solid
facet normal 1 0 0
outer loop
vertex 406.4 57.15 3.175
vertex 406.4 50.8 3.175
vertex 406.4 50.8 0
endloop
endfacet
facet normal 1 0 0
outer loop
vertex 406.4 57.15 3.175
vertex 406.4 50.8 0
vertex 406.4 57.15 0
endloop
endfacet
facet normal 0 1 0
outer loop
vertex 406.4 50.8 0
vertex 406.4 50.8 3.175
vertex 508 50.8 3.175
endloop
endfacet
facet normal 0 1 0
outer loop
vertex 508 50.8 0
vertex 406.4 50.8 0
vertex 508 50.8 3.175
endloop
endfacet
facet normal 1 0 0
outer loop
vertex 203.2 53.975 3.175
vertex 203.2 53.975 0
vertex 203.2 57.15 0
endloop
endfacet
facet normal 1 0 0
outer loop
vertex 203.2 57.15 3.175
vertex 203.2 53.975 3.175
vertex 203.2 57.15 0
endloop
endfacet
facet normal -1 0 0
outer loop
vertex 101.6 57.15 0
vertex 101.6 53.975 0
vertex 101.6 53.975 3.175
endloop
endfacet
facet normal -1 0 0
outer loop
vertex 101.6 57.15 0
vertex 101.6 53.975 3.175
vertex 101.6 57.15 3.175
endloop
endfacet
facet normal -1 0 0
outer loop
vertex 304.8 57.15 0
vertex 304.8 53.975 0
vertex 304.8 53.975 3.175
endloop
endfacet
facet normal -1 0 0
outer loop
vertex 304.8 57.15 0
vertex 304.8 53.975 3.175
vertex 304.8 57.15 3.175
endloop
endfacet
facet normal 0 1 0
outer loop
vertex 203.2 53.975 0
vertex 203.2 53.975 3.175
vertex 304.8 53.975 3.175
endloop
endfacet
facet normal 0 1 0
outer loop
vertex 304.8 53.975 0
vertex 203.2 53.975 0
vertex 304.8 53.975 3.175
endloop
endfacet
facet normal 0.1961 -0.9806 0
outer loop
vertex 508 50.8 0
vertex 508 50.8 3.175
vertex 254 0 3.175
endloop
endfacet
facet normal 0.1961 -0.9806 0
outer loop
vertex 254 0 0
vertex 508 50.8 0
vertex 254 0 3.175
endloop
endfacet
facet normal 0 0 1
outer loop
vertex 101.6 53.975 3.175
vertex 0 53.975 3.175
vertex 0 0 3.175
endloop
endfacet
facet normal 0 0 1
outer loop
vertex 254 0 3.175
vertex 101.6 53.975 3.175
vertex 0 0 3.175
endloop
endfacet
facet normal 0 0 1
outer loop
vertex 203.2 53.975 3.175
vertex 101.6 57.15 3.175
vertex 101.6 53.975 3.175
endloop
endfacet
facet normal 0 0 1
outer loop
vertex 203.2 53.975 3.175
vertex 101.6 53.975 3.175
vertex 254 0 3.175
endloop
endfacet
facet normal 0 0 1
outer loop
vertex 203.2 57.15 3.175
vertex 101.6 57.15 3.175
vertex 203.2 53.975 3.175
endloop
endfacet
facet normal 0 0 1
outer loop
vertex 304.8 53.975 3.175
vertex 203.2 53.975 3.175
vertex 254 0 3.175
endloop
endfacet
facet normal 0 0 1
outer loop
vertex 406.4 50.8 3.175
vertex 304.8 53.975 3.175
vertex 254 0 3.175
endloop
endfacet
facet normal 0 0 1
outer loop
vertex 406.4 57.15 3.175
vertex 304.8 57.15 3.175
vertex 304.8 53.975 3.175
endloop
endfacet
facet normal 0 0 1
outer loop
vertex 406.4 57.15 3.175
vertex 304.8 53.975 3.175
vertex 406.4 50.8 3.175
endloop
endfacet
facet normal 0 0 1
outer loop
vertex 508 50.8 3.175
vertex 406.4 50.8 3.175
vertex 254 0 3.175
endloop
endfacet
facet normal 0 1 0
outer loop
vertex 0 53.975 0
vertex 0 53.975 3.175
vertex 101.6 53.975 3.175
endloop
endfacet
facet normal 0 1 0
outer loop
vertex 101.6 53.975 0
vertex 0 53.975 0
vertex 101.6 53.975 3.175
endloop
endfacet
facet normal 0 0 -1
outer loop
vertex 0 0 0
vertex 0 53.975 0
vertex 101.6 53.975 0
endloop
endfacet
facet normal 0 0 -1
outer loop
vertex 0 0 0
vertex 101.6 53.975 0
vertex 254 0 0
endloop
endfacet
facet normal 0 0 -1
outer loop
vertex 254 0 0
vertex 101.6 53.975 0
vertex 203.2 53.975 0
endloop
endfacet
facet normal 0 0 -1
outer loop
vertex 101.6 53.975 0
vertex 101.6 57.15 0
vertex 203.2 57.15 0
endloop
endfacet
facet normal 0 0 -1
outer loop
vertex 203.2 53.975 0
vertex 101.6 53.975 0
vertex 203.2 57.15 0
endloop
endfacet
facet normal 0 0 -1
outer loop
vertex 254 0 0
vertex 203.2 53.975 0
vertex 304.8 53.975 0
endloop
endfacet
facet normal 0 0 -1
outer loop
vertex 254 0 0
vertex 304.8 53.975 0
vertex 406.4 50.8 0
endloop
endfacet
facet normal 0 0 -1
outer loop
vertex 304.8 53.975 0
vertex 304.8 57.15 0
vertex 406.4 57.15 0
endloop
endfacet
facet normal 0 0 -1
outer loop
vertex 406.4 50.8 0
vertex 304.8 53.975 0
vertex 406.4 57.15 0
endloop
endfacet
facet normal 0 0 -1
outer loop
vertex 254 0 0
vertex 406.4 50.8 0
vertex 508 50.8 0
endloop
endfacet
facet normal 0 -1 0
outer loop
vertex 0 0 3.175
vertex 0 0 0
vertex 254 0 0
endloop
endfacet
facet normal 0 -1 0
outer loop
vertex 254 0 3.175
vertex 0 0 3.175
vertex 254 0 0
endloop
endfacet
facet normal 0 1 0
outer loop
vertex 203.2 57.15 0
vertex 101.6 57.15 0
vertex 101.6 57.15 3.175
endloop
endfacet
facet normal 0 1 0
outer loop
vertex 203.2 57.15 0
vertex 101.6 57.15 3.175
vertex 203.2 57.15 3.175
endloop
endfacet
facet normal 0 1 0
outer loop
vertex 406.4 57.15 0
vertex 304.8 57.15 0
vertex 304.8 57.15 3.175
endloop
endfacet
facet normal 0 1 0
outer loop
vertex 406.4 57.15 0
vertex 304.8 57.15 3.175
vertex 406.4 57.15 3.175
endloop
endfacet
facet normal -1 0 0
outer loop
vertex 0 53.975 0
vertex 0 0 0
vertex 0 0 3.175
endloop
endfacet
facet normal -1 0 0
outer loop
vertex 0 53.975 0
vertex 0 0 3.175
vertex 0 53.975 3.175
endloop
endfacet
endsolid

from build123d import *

# Parameters (mm, degrees)
F0_W     = 508
F0_H     = 57.15
F1_DEPTH = 3.175
F4_DEPTH = 25.4
F2_W     = 101.6
F2_H     = 3.175
F5_DEPTH = 25.4
F6_W     = 101.6
F6_H     = 3.175
F7_DEPTH = 25.4


with BuildPart() as f1:
    # F0 (on Top) → F1 (new body)
    with BuildSketch(Plane.XY):
        with Locations((254, 28.575)):
            Rectangle(F0_W, F0_H)
    extrude(amount=F1_DEPTH)

    # F3 (on face) → F4 (cut)
    with BuildSketch(Plane.XY.offset(3.175)):
        Polygon((508, 50.8), (254, 0), (508, 0), align=None)
    extrude(amount=-F4_DEPTH, mode=Mode.SUBTRACT)

    # F2 (on face) → F5 (cut)
    with BuildSketch(Plane.XY.offset(3.175)):
        with Locations((50.8, 55.5625)):
            Rectangle(F2_W, F2_H)
        with Locations((254, 55.5625)):
            Rectangle(F2_W, F2_H)
        with Locations((457.2, 55.5625)):
            Rectangle(F2_W, F2_H)
    extrude(amount=-F5_DEPTH, mode=Mode.SUBTRACT)

    # F6 (on face) → F7 (cut)
    with BuildSketch(Plane.XY.offset(3.175)):
        with Locations((457.2, 52.3875)):
            Rectangle(F6_W, F6_H)
    extrude(amount=-F7_DEPTH, mode=Mode.SUBTRACT)


solid = f1.part
